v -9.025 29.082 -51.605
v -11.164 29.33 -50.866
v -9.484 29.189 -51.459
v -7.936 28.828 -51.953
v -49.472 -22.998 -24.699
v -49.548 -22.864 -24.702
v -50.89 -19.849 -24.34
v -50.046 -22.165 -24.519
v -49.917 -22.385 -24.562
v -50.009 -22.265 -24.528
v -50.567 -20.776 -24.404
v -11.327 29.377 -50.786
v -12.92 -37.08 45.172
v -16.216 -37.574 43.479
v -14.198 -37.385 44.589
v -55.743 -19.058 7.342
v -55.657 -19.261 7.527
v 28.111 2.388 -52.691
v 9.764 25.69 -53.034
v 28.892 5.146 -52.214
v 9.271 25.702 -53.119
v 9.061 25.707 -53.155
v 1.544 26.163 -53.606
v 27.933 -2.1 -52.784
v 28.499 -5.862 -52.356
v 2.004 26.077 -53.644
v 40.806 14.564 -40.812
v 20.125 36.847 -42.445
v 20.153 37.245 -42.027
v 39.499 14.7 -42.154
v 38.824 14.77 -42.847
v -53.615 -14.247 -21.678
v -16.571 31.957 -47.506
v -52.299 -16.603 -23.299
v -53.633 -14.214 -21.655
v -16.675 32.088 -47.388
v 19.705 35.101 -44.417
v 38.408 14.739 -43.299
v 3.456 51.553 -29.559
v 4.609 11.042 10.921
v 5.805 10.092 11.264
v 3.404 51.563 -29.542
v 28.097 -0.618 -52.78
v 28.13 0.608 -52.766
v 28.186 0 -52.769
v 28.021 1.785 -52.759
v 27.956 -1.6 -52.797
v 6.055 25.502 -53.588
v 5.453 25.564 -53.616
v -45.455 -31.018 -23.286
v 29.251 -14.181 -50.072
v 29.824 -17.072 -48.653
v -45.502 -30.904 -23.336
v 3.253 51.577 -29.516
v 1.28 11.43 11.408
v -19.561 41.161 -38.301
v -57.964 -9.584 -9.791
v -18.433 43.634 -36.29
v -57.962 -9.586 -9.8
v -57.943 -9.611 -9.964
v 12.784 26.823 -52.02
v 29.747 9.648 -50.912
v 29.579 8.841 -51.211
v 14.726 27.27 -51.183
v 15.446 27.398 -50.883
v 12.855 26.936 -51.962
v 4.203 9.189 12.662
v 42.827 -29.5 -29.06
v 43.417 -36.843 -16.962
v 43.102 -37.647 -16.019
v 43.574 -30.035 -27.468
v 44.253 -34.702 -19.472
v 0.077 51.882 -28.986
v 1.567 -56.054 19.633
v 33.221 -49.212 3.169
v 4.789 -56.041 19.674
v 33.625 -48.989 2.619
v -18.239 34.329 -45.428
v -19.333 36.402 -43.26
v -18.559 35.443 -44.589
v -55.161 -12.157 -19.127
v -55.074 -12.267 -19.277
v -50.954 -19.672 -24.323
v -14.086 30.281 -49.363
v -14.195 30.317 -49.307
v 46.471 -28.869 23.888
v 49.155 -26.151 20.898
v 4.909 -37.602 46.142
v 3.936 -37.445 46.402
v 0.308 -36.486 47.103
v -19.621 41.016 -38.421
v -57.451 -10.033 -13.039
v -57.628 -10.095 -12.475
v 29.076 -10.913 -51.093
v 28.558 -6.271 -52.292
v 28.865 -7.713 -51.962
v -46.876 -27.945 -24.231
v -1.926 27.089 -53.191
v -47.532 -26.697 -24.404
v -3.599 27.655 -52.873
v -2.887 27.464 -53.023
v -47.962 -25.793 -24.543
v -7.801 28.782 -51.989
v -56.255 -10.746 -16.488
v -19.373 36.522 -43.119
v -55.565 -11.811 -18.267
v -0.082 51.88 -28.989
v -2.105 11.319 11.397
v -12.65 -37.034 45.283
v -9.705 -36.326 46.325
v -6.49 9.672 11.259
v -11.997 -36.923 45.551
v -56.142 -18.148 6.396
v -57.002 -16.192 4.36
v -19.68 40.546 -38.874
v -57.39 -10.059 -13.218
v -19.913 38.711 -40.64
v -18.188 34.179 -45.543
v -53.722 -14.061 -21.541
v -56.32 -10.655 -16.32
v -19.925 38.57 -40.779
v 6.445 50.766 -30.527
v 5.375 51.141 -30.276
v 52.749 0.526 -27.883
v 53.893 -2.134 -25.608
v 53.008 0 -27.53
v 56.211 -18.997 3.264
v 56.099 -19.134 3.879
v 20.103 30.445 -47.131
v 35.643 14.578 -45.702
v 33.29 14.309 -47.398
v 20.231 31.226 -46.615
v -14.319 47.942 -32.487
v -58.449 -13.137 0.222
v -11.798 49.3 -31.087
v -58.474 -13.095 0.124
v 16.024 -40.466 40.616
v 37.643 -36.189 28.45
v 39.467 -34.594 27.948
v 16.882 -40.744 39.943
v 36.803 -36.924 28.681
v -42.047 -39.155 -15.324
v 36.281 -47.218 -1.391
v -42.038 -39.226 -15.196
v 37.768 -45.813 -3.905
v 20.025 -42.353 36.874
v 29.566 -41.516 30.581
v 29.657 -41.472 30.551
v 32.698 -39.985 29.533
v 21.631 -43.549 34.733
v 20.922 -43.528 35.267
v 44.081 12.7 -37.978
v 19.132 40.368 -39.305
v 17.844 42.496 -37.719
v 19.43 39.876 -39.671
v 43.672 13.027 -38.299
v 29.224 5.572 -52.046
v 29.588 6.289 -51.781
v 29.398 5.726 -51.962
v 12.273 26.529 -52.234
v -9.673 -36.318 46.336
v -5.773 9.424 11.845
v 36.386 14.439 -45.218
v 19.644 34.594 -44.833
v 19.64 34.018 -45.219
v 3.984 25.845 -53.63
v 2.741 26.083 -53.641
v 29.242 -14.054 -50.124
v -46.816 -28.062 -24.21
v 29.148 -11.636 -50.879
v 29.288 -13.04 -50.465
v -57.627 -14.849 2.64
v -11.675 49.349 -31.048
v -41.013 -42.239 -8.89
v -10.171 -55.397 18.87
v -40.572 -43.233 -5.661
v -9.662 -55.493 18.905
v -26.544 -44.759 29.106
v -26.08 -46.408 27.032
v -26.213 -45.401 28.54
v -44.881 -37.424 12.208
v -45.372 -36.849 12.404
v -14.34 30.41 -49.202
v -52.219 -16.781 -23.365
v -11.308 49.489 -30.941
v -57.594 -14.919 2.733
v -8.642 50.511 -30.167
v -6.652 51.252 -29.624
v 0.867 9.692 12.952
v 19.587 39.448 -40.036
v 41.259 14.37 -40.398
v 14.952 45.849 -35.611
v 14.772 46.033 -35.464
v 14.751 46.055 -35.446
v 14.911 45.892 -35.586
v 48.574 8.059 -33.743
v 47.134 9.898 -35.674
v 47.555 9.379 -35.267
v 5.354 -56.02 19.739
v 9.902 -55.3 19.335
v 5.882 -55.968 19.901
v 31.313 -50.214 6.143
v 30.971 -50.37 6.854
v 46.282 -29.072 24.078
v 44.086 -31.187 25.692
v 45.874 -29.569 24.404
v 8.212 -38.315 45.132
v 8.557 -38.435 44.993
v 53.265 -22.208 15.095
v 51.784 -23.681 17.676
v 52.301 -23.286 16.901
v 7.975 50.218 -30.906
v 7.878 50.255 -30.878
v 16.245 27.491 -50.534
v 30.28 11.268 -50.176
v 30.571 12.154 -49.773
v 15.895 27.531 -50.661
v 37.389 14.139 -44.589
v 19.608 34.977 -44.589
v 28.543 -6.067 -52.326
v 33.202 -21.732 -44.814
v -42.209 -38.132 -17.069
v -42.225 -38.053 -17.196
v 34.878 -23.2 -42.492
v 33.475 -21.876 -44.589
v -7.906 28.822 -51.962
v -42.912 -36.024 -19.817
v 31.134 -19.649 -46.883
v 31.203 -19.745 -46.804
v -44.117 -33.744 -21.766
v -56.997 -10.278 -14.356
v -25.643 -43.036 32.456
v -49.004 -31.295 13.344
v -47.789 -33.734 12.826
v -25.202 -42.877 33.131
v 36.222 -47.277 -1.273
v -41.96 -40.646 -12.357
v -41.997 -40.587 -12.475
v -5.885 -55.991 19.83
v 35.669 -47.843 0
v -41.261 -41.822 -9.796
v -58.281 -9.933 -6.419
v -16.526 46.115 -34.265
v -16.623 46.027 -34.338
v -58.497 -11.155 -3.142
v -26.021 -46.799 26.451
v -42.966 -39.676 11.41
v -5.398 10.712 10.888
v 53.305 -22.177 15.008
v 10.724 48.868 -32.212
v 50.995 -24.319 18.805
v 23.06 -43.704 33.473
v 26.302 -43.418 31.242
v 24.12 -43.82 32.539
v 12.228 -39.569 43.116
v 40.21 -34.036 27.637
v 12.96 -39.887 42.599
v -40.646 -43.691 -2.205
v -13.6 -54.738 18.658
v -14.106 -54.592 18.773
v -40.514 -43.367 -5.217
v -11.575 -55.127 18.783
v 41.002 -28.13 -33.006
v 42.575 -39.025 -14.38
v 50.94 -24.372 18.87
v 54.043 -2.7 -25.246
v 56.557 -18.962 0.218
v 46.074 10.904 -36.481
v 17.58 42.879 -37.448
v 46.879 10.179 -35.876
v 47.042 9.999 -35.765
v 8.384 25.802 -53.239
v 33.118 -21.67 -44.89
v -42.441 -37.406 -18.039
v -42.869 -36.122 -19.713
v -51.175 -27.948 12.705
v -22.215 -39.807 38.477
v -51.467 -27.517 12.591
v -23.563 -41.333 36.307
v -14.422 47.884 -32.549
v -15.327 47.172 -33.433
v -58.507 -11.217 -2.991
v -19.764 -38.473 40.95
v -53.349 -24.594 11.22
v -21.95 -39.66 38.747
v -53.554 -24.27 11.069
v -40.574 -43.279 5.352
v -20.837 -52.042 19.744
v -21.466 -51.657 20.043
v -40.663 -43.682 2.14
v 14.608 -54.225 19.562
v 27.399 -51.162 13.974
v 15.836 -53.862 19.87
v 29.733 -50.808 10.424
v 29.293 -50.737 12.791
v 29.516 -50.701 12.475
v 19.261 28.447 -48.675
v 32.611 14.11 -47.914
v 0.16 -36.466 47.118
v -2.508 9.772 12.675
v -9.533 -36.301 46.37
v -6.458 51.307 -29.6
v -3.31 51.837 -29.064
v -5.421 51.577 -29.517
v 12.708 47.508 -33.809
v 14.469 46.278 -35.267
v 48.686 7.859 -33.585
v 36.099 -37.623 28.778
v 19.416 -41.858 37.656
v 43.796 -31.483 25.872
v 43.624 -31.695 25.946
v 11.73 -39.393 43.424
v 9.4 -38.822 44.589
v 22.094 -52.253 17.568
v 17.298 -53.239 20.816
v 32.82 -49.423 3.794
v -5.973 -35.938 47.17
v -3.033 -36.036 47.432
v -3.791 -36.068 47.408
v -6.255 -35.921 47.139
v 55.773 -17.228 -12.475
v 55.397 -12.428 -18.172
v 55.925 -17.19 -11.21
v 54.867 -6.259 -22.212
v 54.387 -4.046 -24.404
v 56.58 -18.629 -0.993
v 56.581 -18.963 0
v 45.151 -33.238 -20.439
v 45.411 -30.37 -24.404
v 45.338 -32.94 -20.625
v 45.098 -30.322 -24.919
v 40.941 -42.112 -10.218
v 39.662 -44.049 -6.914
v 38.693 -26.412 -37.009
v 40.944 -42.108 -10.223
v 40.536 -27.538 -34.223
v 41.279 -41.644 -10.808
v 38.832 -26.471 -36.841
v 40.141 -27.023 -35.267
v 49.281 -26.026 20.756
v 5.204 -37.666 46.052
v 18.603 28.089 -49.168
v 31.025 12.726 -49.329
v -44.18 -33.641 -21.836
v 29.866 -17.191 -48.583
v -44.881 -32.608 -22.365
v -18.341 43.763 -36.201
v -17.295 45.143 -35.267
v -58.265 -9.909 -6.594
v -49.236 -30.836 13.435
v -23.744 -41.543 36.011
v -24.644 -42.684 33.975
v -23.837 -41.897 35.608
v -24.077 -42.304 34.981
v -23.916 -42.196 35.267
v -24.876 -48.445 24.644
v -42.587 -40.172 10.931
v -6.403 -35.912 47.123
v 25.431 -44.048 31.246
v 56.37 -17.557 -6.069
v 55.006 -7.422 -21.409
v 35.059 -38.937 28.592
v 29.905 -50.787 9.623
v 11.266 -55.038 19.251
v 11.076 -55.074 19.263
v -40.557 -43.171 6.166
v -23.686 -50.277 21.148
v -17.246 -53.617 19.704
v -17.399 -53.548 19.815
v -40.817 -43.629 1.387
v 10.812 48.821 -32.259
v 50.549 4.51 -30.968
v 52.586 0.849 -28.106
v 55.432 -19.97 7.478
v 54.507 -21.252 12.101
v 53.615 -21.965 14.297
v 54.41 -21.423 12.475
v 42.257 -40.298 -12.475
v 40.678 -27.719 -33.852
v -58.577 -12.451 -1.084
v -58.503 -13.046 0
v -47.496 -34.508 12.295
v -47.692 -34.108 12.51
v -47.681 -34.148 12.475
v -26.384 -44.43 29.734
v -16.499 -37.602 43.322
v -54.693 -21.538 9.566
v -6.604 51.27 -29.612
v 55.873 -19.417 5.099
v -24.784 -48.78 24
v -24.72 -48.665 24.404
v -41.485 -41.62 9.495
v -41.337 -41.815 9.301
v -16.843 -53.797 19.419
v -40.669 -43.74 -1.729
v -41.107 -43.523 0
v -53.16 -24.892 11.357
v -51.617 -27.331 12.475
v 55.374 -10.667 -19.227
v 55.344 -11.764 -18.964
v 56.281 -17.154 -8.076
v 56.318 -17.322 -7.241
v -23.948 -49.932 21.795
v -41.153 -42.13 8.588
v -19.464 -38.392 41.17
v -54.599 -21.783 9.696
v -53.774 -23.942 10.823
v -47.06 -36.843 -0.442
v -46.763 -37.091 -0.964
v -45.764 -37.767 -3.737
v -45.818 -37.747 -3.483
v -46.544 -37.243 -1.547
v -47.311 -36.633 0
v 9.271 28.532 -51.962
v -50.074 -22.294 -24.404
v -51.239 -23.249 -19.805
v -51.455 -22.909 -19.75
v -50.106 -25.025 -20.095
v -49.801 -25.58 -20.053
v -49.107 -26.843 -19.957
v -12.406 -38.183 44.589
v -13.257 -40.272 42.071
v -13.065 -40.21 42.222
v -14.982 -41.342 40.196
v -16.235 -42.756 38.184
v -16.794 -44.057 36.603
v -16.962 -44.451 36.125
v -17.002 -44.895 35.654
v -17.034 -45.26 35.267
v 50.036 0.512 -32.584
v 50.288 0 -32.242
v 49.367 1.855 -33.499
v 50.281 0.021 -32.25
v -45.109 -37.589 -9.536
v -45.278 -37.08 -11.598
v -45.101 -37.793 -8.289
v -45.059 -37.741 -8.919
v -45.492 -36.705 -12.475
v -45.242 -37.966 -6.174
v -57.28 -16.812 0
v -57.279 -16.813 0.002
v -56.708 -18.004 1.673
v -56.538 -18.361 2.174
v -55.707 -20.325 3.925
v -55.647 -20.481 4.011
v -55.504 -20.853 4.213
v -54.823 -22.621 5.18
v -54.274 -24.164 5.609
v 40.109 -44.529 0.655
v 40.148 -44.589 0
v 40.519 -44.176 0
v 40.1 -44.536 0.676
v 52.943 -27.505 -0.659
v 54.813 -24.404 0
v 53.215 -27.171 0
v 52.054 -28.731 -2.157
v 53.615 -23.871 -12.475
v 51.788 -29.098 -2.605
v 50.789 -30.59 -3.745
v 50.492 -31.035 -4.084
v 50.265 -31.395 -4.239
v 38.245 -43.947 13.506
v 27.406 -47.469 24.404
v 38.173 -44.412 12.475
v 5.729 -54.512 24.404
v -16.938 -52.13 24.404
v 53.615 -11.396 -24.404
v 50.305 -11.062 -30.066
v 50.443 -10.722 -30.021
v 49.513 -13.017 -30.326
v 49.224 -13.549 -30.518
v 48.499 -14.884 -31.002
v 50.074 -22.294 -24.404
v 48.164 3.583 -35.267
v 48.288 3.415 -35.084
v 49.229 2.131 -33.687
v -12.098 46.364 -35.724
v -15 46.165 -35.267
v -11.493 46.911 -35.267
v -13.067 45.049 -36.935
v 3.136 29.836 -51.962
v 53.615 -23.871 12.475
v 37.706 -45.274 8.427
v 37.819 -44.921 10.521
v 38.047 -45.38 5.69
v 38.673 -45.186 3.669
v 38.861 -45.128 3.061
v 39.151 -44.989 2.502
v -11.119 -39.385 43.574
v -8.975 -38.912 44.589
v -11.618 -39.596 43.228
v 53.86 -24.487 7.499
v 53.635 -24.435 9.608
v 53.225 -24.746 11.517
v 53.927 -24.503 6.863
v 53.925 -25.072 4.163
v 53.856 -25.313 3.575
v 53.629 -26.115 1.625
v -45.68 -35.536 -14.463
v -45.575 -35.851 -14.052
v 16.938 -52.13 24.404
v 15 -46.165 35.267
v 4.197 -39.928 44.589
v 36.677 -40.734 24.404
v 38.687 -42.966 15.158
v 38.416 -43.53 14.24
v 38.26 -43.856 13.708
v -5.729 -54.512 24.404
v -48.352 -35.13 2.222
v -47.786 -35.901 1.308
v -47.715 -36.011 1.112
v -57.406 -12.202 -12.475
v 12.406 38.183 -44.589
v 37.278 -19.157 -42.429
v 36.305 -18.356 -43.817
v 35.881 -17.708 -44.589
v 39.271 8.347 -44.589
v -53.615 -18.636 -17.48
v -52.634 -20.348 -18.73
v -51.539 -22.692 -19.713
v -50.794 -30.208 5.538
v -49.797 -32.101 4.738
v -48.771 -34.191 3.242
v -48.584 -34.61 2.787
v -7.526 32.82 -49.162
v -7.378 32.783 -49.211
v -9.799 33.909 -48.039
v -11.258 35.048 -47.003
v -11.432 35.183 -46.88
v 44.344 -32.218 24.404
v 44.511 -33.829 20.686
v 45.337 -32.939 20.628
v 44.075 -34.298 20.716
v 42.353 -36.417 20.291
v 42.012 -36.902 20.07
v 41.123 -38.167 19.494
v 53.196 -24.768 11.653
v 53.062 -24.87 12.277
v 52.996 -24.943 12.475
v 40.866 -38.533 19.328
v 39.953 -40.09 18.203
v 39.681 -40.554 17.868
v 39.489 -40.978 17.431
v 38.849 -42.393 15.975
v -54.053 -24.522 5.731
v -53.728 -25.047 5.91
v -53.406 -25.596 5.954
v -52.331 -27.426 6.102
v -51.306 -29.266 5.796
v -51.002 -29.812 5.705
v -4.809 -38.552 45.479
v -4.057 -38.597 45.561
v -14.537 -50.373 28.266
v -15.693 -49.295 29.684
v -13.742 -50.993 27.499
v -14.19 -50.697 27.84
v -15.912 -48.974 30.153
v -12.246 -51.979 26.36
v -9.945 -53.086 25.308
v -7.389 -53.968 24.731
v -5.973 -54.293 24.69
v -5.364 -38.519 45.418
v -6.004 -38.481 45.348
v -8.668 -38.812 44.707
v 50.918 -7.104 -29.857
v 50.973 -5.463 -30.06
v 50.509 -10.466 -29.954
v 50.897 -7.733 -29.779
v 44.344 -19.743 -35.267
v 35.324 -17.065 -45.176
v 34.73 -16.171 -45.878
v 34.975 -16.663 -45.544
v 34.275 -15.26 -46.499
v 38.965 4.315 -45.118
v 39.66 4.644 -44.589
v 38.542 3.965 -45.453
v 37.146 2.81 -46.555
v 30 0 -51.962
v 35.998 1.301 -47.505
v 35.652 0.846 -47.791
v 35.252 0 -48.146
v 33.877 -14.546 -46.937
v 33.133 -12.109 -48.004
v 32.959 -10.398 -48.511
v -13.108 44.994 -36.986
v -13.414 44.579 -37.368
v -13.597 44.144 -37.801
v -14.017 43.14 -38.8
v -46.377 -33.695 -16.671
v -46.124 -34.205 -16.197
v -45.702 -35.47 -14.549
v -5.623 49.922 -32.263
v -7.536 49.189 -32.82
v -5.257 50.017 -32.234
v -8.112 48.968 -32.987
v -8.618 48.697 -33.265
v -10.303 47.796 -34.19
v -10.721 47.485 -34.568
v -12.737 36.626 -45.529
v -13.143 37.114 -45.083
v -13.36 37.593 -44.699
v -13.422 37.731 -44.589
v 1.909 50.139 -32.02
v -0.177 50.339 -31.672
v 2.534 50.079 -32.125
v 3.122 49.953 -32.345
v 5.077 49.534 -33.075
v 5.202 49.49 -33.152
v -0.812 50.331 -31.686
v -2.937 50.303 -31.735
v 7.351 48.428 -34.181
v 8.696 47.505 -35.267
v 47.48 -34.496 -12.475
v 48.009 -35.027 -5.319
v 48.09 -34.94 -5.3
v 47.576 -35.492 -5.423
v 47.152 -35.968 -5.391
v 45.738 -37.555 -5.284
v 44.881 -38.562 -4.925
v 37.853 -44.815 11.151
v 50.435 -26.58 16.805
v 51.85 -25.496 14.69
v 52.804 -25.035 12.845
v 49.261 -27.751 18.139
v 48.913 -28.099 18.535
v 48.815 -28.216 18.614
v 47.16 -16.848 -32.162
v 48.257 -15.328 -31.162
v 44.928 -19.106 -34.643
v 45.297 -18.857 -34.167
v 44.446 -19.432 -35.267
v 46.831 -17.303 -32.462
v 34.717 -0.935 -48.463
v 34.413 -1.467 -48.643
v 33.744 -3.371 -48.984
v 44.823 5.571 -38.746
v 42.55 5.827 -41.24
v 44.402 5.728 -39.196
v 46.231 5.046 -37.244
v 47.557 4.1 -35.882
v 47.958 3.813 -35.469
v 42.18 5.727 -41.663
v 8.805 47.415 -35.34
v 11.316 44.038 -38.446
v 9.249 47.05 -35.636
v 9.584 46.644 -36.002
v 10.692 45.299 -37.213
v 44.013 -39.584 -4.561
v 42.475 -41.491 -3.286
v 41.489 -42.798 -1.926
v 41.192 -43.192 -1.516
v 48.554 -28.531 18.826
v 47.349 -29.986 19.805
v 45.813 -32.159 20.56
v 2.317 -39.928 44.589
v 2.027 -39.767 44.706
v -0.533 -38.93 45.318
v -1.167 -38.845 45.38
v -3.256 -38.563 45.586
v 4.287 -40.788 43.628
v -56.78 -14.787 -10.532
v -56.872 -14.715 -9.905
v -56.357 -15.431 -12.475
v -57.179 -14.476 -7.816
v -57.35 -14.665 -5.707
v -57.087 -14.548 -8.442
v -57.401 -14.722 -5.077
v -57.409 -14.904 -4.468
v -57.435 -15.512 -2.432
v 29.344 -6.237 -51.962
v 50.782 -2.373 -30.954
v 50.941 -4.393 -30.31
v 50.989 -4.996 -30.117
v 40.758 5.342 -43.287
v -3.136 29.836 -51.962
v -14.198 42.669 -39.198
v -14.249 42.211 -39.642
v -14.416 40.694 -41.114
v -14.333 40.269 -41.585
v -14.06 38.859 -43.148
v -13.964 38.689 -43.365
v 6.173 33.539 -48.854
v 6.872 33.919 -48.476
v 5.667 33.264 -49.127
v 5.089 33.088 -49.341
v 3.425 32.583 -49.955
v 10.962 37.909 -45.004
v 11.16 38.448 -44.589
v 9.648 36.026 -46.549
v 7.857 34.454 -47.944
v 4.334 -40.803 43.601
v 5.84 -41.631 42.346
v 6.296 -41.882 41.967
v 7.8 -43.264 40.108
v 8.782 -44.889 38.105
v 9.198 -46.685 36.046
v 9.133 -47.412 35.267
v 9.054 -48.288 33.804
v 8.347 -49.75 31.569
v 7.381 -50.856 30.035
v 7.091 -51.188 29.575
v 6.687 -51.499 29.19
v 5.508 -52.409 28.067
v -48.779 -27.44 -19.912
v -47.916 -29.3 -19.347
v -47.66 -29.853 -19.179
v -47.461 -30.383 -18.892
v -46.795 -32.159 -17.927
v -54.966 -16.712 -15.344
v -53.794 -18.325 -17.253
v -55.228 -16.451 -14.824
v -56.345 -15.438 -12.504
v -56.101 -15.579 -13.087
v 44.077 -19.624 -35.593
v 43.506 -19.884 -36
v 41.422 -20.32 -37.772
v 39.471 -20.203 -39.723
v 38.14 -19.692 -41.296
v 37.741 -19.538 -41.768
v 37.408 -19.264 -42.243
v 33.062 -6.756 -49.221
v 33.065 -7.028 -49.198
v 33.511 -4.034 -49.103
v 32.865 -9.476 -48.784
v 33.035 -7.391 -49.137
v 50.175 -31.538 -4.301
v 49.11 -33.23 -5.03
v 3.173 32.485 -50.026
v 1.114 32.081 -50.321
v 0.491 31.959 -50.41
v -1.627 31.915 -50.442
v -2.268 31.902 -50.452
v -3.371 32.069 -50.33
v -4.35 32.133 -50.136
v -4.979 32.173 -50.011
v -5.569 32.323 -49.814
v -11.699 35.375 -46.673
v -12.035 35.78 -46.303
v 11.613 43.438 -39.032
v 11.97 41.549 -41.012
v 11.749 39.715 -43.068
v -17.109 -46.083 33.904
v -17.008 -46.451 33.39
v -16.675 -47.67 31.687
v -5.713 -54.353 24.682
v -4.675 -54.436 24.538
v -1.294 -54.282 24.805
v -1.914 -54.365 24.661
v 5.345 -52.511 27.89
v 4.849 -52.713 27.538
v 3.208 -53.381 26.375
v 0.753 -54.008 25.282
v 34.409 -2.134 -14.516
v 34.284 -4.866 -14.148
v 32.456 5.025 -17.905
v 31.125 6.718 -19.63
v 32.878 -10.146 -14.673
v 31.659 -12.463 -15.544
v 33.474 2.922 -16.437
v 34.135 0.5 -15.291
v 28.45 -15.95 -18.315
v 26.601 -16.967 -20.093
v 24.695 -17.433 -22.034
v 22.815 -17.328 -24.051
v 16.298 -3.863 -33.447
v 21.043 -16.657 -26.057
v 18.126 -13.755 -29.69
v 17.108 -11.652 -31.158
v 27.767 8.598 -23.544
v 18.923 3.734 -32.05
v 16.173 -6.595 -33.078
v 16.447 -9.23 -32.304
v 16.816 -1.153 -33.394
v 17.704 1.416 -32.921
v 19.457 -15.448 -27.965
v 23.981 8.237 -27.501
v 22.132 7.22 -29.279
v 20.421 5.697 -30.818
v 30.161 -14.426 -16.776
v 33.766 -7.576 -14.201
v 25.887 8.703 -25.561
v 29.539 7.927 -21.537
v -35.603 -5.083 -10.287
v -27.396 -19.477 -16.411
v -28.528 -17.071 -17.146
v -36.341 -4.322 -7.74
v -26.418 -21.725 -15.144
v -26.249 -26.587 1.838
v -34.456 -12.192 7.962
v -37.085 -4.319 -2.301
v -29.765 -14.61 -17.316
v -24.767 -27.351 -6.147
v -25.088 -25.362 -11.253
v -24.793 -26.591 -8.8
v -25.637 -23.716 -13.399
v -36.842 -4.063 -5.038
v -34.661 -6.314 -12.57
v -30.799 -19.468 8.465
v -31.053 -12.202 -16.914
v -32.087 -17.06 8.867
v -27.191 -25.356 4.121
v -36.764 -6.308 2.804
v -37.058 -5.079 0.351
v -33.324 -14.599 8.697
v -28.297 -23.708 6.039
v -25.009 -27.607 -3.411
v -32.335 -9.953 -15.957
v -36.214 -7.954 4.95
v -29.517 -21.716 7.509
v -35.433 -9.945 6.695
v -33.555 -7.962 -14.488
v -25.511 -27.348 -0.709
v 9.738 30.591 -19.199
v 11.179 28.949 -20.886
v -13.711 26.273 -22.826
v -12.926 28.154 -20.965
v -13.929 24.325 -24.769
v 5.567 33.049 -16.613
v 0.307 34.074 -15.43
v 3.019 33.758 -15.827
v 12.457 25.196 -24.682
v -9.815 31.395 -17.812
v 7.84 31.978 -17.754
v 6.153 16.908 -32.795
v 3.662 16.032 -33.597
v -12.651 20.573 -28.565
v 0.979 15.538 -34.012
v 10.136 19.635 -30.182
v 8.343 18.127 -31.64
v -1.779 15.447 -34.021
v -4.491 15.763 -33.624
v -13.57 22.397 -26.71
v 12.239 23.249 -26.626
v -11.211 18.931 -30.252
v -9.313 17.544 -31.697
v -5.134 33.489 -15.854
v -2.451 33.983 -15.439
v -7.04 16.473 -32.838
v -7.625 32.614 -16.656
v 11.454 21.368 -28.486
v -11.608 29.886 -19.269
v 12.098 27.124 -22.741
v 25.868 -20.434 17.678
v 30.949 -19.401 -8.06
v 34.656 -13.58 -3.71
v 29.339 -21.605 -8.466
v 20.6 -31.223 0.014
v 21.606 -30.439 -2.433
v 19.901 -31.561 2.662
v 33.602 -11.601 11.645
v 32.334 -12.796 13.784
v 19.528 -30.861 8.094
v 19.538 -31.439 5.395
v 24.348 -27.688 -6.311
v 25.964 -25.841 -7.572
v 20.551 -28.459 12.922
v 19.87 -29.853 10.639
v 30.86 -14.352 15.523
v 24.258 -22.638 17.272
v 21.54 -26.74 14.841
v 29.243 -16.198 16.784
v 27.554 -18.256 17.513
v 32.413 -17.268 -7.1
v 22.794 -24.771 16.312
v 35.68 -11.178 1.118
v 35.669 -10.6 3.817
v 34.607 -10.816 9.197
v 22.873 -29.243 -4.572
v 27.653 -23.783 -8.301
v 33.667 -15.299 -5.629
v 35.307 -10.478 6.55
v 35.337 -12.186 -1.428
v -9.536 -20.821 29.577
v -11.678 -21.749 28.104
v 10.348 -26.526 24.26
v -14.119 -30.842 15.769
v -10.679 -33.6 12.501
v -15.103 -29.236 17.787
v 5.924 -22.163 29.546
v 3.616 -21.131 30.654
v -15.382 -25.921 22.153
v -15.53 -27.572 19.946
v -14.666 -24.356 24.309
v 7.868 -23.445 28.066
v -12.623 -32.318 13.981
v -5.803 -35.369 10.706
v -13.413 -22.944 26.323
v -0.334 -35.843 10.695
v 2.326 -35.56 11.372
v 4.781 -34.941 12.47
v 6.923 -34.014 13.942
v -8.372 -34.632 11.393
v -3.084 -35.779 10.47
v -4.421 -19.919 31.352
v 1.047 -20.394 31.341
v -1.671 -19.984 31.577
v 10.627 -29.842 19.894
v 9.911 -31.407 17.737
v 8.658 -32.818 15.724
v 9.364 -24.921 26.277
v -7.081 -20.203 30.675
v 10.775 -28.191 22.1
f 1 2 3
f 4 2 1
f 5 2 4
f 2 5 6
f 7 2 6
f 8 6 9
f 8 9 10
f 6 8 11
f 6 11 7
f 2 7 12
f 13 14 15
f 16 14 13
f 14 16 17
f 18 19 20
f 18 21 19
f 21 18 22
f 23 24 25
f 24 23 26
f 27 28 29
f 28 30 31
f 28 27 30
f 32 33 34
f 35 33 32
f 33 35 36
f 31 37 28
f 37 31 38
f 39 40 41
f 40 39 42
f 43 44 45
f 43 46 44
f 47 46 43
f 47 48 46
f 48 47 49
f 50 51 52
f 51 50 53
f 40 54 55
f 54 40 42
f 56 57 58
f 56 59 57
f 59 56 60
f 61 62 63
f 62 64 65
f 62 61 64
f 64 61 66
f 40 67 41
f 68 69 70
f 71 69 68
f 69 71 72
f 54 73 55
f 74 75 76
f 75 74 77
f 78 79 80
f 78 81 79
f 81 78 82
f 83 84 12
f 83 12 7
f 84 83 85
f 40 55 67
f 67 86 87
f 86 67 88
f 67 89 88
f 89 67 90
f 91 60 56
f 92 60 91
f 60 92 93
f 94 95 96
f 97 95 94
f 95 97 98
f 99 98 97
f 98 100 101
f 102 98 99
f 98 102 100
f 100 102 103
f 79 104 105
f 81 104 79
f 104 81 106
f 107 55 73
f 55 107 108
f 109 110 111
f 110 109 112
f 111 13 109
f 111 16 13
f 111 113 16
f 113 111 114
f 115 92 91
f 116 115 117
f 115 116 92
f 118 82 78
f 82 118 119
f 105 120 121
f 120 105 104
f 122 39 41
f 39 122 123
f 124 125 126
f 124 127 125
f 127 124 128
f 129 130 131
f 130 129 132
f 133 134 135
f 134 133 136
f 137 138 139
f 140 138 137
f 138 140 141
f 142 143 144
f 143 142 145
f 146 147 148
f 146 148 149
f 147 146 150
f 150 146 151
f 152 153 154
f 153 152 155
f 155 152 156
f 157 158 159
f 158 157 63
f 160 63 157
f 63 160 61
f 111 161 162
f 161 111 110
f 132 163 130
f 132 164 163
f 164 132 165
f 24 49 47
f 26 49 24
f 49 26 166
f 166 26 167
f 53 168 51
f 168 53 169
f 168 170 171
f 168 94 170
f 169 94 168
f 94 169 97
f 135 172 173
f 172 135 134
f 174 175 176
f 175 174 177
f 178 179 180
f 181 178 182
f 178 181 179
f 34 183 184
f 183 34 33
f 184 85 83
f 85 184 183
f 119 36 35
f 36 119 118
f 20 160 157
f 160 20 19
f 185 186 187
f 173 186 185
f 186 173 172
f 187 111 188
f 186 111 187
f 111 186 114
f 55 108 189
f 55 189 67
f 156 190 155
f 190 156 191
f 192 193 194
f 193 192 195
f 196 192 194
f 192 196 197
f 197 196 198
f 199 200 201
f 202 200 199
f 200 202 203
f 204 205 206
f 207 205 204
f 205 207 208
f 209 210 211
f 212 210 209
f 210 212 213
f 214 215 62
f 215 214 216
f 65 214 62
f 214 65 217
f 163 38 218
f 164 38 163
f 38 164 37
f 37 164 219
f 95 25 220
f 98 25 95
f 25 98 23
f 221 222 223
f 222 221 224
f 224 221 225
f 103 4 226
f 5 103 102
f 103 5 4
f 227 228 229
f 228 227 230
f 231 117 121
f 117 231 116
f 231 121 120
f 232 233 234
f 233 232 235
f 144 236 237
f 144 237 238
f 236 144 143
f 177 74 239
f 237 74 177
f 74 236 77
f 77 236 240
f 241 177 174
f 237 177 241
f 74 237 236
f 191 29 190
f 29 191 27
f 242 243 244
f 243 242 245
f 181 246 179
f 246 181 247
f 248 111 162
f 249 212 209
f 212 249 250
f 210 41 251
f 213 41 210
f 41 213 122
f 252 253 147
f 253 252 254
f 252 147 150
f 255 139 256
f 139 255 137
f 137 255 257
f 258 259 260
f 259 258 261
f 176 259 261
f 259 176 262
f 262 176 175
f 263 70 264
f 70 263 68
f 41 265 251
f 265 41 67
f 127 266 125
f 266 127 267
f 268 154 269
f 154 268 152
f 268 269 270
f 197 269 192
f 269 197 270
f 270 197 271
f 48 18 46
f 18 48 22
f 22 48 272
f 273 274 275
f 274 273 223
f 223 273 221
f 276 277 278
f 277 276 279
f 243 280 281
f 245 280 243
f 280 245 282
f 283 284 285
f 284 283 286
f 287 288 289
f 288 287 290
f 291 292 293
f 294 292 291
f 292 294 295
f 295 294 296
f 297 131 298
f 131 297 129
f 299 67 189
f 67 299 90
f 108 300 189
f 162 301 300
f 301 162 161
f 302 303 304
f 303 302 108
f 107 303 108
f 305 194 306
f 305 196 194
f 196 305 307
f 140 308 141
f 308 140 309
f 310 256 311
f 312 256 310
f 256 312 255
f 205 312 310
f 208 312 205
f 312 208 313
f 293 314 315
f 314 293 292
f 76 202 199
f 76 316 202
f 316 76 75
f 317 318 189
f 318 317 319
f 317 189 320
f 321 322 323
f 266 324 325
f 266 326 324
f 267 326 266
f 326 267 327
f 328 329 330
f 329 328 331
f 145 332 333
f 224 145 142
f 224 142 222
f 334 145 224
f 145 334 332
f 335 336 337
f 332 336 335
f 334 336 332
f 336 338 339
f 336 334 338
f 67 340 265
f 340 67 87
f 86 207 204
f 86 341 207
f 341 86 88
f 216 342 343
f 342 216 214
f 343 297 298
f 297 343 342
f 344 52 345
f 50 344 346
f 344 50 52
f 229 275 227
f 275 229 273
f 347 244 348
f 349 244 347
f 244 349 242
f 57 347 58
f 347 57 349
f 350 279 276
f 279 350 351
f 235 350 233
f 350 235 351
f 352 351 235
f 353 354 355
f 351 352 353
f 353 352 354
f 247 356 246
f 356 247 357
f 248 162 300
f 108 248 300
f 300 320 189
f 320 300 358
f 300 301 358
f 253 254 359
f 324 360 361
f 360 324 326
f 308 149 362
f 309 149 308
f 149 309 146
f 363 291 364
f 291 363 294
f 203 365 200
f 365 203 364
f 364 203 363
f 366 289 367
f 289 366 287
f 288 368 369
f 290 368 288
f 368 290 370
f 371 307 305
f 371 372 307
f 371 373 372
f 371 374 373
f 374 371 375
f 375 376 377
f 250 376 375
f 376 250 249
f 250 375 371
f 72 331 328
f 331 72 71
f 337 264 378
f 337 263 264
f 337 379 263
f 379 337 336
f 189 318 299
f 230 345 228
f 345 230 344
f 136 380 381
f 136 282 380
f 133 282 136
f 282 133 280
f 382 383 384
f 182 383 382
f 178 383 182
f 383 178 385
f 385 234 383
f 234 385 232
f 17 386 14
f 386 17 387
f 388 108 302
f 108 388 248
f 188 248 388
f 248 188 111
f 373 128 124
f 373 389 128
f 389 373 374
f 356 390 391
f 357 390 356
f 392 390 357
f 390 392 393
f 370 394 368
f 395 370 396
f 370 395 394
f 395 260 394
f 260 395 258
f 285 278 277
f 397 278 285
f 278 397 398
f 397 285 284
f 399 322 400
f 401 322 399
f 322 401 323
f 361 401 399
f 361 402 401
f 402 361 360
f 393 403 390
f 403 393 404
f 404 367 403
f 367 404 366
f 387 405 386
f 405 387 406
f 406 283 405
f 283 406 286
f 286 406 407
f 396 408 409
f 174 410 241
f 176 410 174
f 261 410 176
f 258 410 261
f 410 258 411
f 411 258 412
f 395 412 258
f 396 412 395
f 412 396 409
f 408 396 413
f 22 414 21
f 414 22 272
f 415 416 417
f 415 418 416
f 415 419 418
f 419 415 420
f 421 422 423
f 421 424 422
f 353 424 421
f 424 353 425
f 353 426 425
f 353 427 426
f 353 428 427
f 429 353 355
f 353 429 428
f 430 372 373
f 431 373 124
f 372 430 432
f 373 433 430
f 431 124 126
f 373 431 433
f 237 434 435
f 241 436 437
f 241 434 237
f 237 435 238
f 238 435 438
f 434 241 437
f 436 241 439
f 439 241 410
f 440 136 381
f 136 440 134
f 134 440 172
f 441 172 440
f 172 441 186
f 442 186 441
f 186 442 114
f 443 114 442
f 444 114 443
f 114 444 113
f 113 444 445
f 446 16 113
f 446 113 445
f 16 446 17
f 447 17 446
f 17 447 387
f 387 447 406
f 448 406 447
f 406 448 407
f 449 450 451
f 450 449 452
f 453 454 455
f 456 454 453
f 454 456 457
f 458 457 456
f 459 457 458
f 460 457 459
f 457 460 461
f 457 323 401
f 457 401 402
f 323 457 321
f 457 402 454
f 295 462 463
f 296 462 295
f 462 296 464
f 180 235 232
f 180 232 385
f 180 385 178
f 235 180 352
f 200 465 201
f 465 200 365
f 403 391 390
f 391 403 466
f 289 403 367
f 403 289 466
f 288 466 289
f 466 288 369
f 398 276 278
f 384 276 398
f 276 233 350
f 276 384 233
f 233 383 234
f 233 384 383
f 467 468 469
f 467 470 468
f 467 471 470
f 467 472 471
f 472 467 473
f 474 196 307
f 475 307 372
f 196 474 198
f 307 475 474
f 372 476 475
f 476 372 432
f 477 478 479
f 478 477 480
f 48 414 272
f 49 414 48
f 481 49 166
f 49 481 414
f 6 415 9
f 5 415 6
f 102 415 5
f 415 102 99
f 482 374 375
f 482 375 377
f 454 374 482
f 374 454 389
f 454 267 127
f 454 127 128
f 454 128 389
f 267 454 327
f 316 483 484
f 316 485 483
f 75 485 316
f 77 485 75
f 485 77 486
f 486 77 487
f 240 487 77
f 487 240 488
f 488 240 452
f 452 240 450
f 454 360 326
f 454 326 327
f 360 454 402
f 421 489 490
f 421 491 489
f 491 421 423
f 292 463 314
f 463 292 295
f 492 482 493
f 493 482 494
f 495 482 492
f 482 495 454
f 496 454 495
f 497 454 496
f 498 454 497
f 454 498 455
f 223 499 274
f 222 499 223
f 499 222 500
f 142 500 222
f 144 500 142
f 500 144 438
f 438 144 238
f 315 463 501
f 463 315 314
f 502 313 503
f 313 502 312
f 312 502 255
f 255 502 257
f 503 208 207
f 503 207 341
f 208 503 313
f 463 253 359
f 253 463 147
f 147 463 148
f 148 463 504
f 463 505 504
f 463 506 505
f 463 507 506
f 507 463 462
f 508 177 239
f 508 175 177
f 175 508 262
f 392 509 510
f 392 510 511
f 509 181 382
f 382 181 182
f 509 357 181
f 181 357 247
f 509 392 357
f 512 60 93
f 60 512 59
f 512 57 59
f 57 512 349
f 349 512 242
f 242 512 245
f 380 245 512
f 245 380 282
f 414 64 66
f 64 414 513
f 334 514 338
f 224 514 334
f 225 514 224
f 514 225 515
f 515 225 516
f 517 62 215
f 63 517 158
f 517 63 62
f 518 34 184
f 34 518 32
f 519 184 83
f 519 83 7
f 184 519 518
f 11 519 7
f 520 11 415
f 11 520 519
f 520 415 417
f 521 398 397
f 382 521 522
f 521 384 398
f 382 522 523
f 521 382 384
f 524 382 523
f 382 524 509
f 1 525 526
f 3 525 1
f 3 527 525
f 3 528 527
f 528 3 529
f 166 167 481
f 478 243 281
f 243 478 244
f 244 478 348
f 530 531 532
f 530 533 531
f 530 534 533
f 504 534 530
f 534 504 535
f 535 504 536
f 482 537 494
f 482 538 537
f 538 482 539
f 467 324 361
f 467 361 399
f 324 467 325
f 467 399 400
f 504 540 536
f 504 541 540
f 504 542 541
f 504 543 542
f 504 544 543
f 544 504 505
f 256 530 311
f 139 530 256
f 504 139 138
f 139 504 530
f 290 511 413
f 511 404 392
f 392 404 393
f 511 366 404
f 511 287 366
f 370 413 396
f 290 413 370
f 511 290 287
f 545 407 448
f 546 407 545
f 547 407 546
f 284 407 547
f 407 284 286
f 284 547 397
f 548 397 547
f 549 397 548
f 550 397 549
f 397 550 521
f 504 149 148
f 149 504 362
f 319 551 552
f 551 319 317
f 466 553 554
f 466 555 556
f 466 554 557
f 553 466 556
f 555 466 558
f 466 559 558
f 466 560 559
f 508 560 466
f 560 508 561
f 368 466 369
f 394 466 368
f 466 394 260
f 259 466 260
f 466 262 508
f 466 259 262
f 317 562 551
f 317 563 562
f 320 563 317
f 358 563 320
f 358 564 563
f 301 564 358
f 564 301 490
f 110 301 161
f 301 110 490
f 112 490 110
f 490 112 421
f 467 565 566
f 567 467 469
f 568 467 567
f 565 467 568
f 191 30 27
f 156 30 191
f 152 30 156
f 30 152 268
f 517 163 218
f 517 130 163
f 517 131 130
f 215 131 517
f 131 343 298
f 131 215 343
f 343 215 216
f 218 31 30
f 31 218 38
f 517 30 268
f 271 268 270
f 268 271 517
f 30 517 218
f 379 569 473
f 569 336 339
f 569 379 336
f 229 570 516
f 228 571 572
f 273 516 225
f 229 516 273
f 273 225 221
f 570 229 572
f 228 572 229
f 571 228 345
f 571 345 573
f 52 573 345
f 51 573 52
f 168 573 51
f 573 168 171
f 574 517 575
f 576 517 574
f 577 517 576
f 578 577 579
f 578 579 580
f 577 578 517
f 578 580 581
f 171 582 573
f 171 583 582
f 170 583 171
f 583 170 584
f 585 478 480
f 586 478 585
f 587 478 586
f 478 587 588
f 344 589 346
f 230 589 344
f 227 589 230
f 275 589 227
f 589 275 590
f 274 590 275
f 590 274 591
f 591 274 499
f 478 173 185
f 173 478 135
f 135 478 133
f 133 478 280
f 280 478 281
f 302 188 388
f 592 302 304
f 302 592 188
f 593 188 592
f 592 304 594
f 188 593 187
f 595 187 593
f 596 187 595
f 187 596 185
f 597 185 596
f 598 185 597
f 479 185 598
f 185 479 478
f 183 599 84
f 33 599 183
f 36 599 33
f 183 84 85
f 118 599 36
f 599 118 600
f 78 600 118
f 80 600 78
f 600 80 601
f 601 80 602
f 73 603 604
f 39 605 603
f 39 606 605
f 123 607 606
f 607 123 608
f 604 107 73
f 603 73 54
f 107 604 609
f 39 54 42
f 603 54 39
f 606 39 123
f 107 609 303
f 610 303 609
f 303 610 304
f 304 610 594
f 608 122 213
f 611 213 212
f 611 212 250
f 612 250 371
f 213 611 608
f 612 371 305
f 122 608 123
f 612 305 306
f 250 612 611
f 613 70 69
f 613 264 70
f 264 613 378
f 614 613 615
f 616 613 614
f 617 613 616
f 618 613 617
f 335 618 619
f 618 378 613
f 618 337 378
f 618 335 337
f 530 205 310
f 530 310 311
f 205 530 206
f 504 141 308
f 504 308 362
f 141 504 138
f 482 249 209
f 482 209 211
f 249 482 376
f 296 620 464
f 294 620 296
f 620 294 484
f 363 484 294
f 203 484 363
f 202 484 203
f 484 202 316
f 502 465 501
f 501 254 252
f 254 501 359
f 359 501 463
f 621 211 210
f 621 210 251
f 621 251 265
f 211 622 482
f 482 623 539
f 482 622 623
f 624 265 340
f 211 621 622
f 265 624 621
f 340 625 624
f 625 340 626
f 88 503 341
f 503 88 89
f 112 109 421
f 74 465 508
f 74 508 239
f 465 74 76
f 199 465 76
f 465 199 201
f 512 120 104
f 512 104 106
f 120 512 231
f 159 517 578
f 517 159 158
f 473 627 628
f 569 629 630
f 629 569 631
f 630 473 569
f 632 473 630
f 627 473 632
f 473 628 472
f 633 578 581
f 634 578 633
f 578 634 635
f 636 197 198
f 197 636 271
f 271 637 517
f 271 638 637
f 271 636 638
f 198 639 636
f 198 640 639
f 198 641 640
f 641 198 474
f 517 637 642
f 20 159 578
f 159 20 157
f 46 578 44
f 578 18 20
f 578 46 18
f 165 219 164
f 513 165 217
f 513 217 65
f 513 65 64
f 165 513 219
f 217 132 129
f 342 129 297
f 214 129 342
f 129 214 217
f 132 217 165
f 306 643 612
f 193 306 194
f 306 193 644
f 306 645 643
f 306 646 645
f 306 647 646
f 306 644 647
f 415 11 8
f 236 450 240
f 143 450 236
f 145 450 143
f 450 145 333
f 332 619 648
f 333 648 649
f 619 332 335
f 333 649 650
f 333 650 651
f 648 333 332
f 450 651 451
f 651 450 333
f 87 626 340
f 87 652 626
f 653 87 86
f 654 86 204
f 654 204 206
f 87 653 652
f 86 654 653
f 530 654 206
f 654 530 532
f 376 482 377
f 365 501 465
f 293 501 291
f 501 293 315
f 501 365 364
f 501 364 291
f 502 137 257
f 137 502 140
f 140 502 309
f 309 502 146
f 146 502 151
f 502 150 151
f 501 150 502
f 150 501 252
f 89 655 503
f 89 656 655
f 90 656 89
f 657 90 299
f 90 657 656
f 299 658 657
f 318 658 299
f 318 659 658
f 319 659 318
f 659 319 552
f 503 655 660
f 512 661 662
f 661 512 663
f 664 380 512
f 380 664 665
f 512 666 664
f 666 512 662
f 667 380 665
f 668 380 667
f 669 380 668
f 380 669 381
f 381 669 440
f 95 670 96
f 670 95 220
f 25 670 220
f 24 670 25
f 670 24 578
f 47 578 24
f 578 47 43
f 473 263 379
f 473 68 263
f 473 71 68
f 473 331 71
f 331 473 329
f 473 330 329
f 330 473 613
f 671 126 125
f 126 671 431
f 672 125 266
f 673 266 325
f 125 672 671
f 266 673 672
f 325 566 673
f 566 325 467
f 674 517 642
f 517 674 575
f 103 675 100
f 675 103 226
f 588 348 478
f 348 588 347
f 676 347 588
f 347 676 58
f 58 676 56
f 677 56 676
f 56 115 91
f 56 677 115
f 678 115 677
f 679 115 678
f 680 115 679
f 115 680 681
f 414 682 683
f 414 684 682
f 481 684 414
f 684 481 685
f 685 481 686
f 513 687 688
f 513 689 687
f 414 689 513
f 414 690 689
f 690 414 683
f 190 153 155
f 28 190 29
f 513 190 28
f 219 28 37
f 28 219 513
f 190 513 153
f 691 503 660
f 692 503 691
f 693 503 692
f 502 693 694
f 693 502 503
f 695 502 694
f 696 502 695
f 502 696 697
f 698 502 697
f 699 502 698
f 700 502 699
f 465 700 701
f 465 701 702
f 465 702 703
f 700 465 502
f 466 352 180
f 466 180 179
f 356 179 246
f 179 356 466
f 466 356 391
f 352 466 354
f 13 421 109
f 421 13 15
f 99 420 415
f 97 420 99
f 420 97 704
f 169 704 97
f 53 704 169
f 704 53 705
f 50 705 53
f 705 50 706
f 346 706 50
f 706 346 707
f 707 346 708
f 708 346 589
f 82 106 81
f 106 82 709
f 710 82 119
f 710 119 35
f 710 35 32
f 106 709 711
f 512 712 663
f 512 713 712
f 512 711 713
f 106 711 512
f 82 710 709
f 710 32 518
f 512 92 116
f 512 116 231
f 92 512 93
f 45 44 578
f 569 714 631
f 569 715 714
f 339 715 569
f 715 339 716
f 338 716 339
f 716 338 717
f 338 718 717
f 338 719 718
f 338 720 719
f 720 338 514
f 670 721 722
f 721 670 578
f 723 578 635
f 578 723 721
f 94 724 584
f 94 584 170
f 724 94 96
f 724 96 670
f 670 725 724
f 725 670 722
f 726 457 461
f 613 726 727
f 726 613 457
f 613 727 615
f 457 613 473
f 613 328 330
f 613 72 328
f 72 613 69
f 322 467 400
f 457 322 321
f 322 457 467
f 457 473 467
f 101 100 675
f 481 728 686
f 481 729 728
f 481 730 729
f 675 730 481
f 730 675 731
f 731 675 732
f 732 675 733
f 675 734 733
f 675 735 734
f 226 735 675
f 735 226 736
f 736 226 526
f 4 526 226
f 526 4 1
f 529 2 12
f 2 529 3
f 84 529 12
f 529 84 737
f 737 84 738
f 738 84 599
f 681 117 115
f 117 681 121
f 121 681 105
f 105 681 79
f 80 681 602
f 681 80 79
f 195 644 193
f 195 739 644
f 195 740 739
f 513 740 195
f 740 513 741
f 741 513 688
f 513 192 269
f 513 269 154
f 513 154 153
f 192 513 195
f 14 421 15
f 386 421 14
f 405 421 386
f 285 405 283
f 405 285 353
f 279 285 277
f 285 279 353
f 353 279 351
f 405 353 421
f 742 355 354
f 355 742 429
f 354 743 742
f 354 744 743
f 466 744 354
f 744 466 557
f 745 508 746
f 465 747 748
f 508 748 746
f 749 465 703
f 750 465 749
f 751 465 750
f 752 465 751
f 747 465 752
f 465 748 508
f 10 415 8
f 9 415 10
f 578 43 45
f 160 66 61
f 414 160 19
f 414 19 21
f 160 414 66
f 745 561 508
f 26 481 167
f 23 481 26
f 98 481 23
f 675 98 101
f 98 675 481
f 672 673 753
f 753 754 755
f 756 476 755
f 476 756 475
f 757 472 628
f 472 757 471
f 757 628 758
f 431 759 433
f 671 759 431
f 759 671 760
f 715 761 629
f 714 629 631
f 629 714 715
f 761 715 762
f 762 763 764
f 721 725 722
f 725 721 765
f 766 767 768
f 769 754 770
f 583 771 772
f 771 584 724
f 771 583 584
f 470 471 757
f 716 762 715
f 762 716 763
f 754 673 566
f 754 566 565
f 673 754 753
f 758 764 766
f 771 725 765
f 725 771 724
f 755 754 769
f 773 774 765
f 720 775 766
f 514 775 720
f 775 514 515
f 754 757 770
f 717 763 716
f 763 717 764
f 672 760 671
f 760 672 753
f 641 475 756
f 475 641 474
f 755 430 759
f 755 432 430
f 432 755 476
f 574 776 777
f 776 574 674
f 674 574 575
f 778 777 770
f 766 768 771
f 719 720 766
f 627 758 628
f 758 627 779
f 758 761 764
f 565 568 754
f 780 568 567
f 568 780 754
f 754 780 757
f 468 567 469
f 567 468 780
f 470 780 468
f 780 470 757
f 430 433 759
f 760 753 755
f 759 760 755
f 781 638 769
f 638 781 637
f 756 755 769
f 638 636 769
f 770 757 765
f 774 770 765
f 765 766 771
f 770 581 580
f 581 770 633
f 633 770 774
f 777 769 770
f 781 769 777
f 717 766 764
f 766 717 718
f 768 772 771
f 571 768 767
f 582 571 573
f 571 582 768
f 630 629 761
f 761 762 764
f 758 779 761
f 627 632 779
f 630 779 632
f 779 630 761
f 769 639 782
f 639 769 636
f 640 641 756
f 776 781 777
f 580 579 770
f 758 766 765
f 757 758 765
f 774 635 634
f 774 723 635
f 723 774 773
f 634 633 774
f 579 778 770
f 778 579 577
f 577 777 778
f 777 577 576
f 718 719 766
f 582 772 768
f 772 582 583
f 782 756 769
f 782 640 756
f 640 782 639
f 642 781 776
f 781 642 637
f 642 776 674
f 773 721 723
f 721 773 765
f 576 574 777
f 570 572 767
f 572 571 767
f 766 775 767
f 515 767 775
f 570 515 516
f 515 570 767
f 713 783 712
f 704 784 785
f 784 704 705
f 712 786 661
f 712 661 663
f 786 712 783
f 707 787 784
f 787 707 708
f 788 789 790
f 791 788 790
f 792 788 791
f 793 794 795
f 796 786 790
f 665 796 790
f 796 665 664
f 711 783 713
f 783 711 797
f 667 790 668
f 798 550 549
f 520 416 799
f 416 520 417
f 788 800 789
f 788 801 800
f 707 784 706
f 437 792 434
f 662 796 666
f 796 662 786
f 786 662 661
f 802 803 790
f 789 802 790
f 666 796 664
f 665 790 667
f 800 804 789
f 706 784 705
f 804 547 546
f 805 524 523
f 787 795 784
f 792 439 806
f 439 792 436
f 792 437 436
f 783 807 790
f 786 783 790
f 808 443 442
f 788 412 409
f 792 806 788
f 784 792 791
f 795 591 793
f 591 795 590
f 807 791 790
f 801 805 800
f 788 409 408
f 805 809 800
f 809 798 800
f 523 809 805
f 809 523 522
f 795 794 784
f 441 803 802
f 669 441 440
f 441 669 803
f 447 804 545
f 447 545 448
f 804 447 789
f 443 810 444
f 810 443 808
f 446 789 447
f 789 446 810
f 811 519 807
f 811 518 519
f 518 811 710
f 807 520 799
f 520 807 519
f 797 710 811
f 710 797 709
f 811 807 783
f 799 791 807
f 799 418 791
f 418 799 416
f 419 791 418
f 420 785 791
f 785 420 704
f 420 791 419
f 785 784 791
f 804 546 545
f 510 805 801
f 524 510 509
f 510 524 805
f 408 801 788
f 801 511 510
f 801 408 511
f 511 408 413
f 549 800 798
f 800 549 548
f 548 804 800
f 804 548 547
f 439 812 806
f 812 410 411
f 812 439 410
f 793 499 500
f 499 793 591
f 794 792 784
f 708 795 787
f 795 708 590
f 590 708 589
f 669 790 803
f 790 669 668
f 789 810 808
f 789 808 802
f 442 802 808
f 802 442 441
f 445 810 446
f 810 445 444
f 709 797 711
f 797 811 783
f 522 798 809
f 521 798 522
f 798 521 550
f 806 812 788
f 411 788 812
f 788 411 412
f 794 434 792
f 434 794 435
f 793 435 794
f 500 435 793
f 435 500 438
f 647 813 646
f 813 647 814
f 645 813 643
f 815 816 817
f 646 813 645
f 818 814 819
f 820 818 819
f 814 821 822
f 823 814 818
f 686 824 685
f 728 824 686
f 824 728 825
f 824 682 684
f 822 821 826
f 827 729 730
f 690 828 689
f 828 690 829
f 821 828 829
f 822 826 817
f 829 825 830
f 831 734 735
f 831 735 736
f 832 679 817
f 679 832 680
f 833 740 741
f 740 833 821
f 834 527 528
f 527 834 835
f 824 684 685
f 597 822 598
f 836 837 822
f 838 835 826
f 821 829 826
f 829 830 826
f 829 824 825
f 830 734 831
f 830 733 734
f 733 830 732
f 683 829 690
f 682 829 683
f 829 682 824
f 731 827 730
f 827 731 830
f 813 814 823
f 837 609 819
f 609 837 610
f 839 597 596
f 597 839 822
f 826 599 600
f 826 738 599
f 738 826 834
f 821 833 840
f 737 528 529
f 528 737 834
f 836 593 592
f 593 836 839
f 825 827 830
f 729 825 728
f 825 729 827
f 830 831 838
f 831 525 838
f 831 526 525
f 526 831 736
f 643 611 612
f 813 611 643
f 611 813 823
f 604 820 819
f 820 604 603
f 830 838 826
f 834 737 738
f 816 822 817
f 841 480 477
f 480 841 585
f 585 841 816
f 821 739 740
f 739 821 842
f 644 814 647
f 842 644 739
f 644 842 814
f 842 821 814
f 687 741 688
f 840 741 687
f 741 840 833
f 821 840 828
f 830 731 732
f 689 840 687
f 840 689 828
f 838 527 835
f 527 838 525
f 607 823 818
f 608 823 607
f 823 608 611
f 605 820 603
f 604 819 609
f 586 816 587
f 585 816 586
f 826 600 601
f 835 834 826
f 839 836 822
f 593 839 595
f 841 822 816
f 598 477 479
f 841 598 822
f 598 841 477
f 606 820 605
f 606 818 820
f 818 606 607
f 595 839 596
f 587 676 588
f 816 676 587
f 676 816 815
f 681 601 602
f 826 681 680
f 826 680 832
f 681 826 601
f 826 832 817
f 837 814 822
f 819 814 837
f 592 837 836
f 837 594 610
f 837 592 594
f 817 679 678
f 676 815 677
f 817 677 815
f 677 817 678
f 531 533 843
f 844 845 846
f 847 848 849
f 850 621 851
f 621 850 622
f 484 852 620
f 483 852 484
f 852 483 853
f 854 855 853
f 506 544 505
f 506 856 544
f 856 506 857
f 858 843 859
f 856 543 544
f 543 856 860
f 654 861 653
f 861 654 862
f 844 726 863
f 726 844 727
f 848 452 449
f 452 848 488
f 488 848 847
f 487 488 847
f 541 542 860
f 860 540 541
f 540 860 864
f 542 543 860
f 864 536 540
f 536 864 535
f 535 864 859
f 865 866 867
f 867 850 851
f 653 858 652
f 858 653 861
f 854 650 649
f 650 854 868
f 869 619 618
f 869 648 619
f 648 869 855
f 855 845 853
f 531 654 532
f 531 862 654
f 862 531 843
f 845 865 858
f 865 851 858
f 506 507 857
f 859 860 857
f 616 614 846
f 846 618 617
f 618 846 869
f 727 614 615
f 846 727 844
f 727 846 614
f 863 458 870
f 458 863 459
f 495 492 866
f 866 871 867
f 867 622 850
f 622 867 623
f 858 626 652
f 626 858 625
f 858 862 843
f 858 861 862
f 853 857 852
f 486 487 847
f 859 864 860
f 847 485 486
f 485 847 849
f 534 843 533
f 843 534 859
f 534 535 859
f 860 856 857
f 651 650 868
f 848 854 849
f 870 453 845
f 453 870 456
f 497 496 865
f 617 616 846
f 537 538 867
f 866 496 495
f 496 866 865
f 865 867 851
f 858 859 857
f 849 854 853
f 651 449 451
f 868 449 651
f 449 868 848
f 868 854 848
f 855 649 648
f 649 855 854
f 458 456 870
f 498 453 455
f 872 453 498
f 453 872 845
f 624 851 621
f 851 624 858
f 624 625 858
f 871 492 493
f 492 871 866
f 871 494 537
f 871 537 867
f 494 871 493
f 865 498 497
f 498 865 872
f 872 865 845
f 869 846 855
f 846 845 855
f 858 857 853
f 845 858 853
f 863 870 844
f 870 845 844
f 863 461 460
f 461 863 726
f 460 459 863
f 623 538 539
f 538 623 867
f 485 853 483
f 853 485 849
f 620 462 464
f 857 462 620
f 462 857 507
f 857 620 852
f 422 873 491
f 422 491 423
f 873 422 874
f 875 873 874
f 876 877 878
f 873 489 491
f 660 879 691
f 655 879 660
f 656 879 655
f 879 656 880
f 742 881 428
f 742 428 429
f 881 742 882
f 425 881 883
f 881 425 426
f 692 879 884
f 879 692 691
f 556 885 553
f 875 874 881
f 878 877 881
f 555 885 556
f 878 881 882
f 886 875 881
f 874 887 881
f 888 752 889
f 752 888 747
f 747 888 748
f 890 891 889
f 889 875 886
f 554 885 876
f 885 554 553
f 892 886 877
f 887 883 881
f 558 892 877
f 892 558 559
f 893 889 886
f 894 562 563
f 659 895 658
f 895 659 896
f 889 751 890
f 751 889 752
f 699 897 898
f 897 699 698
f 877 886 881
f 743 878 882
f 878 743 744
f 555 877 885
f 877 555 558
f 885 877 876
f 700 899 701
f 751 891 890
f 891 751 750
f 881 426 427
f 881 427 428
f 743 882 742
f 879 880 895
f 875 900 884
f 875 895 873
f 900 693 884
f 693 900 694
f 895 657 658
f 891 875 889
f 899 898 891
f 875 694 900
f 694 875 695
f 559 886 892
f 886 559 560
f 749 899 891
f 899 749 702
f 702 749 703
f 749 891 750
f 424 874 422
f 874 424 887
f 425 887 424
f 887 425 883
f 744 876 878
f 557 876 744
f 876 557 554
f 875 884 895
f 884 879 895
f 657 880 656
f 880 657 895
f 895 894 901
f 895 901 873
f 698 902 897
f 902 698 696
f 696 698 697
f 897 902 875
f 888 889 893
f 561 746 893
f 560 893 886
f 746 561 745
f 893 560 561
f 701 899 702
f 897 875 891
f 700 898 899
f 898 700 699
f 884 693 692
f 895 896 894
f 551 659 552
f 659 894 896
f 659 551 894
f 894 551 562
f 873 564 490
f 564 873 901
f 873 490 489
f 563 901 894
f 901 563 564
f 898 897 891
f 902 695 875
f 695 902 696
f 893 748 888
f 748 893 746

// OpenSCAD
difference() {
	intersection() {
		hull() {
			rotate(a = -120.3141209556, v = [0.7944260306, 0.3378230484, -0.0000000000]) {
				rotate(a = -90.0000000000, v = [0.9659258263, -0.2588190451, 0.0000000000]) {
					cylinder(h = 60, r = 16.2000000000);
				}
			}
			rotate(a = -120.3141209556, v = [0.7944260306, 0.3378230484, -0.0000000000]) {
				rotate(a = -90.0000000000, v = [-0.2588190451, 0.9659258263, 0.0000000000]) {
					cylinder(h = 60, r = 16.2000000000);
				}
			}
			rotate(a = -120.3141209556, v = [0.7944260306, 0.3378230484, -0.0000000000]) {
				rotate(a = -22.2263282801, v = [0.3557637402, -0.1285203412, 0.0000000000]) {
					cylinder(h = 60, r = 16.2000000000);
				}
			}
			rotate(a = -120.3141209556, v = [0.7944260306, 0.3378230484, -0.0000000000]) {
				rotate(a = -144.0917087294, v = [0.4875669891, -0.3259577409, 0.0000000000]) {
					cylinder(h = 60, r = 16.2000000000);
				}
			}
			rotate(a = -120.3141209556, v = [0.7944260306, 0.3378230484, -0.0000000000]) {
				rotate(a = -155.9342565737, v = [-0.2954832486, 0.2810301414, 0.0000000000]) {
					cylinder(h = 60, r = 16.2000000000);
				}
			}
		}
		sphere(r = 60);
	}
	union() {
		rotate(a = -120.3141209556, v = [0.7944260306, 0.3378230484, -0.0000000000]) {
			rotate(a = -90.0000000000, v = [0.9659258263, -0.2588190451, 0.0000000000]) {
				translate(v = [0, 0, 35]) {
					cylinder(h = 100, r = 13.2000000000);
				}
			}
		}
		rotate(a = -120.3141209556, v = [0.7944260306, 0.3378230484, -0.0000000000]) {
			rotate(a = -90.0000000000, v = [-0.2588190451, 0.9659258263, 0.0000000000]) {
				translate(v = [0, 0, 35]) {
					cylinder(h = 100, r = 13.2000000000);
				}
			}
		}
		rotate(a = -120.3141209556, v = [0.7944260306, 0.3378230484, -0.0000000000]) {
			rotate(a = -22.2263282801, v = [0.3557637402, -0.1285203412, 0.0000000000]) {
				translate(v = [0, 0, 35]) {
					cylinder(h = 100, r = 13.2000000000);
				}
			}
		}
		rotate(a = -120.3141209556, v = [0.7944260306, 0.3378230484, -0.0000000000]) {
			rotate(a = -144.0917087294, v = [0.4875669891, -0.3259577409, 0.0000000000]) {
				translate(v = [0, 0, 35]) {
					cylinder(h = 100, r = 13.2000000000);
				}
			}
		}
		rotate(a = -120.3141209556, v = [0.7944260306, 0.3378230484, -0.0000000000]) {
			rotate(a = -155.9342565737, v = [-0.2954832486, 0.2810301414, 0.0000000000]) {
				translate(v = [0, 0, 35]) {
					cylinder(h = 100, r = 13.2000000000);
				}
			}
		}
	}
}
